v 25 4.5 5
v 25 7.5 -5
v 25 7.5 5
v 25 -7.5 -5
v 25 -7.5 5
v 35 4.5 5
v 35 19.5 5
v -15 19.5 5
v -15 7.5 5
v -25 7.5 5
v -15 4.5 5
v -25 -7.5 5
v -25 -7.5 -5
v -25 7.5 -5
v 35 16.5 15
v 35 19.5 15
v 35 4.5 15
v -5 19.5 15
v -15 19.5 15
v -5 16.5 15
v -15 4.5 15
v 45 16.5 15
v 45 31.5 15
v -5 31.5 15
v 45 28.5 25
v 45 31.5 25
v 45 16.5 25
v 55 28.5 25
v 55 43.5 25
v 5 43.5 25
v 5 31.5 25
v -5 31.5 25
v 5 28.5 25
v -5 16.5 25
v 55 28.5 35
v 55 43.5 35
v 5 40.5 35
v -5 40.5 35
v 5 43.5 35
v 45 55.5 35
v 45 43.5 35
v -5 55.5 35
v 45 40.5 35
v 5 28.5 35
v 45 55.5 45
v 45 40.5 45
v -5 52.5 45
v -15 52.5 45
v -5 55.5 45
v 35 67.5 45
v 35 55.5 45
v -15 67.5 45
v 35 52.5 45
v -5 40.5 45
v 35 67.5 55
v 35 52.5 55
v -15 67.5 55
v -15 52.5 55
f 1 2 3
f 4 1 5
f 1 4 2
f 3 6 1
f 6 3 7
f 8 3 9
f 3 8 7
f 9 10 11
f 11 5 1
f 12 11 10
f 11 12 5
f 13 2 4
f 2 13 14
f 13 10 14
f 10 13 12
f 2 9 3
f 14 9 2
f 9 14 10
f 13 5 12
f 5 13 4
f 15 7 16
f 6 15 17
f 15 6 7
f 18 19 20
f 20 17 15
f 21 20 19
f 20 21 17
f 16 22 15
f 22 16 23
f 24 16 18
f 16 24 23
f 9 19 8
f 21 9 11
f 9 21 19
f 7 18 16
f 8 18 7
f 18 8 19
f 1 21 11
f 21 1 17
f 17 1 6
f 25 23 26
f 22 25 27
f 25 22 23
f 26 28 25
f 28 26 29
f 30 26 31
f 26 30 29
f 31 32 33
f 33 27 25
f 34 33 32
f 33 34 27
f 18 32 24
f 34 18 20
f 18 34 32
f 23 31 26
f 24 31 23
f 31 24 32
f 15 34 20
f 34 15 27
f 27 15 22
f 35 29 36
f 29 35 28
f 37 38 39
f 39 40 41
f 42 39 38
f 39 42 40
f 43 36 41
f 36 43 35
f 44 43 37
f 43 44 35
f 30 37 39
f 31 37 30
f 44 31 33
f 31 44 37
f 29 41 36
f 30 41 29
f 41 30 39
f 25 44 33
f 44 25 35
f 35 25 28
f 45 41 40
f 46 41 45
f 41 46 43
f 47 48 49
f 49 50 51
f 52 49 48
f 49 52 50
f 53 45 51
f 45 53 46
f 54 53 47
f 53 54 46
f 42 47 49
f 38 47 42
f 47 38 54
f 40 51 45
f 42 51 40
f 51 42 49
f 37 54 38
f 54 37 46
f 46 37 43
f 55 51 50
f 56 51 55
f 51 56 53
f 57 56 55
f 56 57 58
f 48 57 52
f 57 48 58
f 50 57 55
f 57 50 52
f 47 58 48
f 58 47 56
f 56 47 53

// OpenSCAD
for(i = [ [ 0,  0,  0],
           [10, 12, 10],
           [20, 24, 20],
           [30, 36, 30],
           [20, 48, 40],
           [10, 60, 50] ])
{
    translate(i)
    cube([50, 15, 10], center = true);
}
